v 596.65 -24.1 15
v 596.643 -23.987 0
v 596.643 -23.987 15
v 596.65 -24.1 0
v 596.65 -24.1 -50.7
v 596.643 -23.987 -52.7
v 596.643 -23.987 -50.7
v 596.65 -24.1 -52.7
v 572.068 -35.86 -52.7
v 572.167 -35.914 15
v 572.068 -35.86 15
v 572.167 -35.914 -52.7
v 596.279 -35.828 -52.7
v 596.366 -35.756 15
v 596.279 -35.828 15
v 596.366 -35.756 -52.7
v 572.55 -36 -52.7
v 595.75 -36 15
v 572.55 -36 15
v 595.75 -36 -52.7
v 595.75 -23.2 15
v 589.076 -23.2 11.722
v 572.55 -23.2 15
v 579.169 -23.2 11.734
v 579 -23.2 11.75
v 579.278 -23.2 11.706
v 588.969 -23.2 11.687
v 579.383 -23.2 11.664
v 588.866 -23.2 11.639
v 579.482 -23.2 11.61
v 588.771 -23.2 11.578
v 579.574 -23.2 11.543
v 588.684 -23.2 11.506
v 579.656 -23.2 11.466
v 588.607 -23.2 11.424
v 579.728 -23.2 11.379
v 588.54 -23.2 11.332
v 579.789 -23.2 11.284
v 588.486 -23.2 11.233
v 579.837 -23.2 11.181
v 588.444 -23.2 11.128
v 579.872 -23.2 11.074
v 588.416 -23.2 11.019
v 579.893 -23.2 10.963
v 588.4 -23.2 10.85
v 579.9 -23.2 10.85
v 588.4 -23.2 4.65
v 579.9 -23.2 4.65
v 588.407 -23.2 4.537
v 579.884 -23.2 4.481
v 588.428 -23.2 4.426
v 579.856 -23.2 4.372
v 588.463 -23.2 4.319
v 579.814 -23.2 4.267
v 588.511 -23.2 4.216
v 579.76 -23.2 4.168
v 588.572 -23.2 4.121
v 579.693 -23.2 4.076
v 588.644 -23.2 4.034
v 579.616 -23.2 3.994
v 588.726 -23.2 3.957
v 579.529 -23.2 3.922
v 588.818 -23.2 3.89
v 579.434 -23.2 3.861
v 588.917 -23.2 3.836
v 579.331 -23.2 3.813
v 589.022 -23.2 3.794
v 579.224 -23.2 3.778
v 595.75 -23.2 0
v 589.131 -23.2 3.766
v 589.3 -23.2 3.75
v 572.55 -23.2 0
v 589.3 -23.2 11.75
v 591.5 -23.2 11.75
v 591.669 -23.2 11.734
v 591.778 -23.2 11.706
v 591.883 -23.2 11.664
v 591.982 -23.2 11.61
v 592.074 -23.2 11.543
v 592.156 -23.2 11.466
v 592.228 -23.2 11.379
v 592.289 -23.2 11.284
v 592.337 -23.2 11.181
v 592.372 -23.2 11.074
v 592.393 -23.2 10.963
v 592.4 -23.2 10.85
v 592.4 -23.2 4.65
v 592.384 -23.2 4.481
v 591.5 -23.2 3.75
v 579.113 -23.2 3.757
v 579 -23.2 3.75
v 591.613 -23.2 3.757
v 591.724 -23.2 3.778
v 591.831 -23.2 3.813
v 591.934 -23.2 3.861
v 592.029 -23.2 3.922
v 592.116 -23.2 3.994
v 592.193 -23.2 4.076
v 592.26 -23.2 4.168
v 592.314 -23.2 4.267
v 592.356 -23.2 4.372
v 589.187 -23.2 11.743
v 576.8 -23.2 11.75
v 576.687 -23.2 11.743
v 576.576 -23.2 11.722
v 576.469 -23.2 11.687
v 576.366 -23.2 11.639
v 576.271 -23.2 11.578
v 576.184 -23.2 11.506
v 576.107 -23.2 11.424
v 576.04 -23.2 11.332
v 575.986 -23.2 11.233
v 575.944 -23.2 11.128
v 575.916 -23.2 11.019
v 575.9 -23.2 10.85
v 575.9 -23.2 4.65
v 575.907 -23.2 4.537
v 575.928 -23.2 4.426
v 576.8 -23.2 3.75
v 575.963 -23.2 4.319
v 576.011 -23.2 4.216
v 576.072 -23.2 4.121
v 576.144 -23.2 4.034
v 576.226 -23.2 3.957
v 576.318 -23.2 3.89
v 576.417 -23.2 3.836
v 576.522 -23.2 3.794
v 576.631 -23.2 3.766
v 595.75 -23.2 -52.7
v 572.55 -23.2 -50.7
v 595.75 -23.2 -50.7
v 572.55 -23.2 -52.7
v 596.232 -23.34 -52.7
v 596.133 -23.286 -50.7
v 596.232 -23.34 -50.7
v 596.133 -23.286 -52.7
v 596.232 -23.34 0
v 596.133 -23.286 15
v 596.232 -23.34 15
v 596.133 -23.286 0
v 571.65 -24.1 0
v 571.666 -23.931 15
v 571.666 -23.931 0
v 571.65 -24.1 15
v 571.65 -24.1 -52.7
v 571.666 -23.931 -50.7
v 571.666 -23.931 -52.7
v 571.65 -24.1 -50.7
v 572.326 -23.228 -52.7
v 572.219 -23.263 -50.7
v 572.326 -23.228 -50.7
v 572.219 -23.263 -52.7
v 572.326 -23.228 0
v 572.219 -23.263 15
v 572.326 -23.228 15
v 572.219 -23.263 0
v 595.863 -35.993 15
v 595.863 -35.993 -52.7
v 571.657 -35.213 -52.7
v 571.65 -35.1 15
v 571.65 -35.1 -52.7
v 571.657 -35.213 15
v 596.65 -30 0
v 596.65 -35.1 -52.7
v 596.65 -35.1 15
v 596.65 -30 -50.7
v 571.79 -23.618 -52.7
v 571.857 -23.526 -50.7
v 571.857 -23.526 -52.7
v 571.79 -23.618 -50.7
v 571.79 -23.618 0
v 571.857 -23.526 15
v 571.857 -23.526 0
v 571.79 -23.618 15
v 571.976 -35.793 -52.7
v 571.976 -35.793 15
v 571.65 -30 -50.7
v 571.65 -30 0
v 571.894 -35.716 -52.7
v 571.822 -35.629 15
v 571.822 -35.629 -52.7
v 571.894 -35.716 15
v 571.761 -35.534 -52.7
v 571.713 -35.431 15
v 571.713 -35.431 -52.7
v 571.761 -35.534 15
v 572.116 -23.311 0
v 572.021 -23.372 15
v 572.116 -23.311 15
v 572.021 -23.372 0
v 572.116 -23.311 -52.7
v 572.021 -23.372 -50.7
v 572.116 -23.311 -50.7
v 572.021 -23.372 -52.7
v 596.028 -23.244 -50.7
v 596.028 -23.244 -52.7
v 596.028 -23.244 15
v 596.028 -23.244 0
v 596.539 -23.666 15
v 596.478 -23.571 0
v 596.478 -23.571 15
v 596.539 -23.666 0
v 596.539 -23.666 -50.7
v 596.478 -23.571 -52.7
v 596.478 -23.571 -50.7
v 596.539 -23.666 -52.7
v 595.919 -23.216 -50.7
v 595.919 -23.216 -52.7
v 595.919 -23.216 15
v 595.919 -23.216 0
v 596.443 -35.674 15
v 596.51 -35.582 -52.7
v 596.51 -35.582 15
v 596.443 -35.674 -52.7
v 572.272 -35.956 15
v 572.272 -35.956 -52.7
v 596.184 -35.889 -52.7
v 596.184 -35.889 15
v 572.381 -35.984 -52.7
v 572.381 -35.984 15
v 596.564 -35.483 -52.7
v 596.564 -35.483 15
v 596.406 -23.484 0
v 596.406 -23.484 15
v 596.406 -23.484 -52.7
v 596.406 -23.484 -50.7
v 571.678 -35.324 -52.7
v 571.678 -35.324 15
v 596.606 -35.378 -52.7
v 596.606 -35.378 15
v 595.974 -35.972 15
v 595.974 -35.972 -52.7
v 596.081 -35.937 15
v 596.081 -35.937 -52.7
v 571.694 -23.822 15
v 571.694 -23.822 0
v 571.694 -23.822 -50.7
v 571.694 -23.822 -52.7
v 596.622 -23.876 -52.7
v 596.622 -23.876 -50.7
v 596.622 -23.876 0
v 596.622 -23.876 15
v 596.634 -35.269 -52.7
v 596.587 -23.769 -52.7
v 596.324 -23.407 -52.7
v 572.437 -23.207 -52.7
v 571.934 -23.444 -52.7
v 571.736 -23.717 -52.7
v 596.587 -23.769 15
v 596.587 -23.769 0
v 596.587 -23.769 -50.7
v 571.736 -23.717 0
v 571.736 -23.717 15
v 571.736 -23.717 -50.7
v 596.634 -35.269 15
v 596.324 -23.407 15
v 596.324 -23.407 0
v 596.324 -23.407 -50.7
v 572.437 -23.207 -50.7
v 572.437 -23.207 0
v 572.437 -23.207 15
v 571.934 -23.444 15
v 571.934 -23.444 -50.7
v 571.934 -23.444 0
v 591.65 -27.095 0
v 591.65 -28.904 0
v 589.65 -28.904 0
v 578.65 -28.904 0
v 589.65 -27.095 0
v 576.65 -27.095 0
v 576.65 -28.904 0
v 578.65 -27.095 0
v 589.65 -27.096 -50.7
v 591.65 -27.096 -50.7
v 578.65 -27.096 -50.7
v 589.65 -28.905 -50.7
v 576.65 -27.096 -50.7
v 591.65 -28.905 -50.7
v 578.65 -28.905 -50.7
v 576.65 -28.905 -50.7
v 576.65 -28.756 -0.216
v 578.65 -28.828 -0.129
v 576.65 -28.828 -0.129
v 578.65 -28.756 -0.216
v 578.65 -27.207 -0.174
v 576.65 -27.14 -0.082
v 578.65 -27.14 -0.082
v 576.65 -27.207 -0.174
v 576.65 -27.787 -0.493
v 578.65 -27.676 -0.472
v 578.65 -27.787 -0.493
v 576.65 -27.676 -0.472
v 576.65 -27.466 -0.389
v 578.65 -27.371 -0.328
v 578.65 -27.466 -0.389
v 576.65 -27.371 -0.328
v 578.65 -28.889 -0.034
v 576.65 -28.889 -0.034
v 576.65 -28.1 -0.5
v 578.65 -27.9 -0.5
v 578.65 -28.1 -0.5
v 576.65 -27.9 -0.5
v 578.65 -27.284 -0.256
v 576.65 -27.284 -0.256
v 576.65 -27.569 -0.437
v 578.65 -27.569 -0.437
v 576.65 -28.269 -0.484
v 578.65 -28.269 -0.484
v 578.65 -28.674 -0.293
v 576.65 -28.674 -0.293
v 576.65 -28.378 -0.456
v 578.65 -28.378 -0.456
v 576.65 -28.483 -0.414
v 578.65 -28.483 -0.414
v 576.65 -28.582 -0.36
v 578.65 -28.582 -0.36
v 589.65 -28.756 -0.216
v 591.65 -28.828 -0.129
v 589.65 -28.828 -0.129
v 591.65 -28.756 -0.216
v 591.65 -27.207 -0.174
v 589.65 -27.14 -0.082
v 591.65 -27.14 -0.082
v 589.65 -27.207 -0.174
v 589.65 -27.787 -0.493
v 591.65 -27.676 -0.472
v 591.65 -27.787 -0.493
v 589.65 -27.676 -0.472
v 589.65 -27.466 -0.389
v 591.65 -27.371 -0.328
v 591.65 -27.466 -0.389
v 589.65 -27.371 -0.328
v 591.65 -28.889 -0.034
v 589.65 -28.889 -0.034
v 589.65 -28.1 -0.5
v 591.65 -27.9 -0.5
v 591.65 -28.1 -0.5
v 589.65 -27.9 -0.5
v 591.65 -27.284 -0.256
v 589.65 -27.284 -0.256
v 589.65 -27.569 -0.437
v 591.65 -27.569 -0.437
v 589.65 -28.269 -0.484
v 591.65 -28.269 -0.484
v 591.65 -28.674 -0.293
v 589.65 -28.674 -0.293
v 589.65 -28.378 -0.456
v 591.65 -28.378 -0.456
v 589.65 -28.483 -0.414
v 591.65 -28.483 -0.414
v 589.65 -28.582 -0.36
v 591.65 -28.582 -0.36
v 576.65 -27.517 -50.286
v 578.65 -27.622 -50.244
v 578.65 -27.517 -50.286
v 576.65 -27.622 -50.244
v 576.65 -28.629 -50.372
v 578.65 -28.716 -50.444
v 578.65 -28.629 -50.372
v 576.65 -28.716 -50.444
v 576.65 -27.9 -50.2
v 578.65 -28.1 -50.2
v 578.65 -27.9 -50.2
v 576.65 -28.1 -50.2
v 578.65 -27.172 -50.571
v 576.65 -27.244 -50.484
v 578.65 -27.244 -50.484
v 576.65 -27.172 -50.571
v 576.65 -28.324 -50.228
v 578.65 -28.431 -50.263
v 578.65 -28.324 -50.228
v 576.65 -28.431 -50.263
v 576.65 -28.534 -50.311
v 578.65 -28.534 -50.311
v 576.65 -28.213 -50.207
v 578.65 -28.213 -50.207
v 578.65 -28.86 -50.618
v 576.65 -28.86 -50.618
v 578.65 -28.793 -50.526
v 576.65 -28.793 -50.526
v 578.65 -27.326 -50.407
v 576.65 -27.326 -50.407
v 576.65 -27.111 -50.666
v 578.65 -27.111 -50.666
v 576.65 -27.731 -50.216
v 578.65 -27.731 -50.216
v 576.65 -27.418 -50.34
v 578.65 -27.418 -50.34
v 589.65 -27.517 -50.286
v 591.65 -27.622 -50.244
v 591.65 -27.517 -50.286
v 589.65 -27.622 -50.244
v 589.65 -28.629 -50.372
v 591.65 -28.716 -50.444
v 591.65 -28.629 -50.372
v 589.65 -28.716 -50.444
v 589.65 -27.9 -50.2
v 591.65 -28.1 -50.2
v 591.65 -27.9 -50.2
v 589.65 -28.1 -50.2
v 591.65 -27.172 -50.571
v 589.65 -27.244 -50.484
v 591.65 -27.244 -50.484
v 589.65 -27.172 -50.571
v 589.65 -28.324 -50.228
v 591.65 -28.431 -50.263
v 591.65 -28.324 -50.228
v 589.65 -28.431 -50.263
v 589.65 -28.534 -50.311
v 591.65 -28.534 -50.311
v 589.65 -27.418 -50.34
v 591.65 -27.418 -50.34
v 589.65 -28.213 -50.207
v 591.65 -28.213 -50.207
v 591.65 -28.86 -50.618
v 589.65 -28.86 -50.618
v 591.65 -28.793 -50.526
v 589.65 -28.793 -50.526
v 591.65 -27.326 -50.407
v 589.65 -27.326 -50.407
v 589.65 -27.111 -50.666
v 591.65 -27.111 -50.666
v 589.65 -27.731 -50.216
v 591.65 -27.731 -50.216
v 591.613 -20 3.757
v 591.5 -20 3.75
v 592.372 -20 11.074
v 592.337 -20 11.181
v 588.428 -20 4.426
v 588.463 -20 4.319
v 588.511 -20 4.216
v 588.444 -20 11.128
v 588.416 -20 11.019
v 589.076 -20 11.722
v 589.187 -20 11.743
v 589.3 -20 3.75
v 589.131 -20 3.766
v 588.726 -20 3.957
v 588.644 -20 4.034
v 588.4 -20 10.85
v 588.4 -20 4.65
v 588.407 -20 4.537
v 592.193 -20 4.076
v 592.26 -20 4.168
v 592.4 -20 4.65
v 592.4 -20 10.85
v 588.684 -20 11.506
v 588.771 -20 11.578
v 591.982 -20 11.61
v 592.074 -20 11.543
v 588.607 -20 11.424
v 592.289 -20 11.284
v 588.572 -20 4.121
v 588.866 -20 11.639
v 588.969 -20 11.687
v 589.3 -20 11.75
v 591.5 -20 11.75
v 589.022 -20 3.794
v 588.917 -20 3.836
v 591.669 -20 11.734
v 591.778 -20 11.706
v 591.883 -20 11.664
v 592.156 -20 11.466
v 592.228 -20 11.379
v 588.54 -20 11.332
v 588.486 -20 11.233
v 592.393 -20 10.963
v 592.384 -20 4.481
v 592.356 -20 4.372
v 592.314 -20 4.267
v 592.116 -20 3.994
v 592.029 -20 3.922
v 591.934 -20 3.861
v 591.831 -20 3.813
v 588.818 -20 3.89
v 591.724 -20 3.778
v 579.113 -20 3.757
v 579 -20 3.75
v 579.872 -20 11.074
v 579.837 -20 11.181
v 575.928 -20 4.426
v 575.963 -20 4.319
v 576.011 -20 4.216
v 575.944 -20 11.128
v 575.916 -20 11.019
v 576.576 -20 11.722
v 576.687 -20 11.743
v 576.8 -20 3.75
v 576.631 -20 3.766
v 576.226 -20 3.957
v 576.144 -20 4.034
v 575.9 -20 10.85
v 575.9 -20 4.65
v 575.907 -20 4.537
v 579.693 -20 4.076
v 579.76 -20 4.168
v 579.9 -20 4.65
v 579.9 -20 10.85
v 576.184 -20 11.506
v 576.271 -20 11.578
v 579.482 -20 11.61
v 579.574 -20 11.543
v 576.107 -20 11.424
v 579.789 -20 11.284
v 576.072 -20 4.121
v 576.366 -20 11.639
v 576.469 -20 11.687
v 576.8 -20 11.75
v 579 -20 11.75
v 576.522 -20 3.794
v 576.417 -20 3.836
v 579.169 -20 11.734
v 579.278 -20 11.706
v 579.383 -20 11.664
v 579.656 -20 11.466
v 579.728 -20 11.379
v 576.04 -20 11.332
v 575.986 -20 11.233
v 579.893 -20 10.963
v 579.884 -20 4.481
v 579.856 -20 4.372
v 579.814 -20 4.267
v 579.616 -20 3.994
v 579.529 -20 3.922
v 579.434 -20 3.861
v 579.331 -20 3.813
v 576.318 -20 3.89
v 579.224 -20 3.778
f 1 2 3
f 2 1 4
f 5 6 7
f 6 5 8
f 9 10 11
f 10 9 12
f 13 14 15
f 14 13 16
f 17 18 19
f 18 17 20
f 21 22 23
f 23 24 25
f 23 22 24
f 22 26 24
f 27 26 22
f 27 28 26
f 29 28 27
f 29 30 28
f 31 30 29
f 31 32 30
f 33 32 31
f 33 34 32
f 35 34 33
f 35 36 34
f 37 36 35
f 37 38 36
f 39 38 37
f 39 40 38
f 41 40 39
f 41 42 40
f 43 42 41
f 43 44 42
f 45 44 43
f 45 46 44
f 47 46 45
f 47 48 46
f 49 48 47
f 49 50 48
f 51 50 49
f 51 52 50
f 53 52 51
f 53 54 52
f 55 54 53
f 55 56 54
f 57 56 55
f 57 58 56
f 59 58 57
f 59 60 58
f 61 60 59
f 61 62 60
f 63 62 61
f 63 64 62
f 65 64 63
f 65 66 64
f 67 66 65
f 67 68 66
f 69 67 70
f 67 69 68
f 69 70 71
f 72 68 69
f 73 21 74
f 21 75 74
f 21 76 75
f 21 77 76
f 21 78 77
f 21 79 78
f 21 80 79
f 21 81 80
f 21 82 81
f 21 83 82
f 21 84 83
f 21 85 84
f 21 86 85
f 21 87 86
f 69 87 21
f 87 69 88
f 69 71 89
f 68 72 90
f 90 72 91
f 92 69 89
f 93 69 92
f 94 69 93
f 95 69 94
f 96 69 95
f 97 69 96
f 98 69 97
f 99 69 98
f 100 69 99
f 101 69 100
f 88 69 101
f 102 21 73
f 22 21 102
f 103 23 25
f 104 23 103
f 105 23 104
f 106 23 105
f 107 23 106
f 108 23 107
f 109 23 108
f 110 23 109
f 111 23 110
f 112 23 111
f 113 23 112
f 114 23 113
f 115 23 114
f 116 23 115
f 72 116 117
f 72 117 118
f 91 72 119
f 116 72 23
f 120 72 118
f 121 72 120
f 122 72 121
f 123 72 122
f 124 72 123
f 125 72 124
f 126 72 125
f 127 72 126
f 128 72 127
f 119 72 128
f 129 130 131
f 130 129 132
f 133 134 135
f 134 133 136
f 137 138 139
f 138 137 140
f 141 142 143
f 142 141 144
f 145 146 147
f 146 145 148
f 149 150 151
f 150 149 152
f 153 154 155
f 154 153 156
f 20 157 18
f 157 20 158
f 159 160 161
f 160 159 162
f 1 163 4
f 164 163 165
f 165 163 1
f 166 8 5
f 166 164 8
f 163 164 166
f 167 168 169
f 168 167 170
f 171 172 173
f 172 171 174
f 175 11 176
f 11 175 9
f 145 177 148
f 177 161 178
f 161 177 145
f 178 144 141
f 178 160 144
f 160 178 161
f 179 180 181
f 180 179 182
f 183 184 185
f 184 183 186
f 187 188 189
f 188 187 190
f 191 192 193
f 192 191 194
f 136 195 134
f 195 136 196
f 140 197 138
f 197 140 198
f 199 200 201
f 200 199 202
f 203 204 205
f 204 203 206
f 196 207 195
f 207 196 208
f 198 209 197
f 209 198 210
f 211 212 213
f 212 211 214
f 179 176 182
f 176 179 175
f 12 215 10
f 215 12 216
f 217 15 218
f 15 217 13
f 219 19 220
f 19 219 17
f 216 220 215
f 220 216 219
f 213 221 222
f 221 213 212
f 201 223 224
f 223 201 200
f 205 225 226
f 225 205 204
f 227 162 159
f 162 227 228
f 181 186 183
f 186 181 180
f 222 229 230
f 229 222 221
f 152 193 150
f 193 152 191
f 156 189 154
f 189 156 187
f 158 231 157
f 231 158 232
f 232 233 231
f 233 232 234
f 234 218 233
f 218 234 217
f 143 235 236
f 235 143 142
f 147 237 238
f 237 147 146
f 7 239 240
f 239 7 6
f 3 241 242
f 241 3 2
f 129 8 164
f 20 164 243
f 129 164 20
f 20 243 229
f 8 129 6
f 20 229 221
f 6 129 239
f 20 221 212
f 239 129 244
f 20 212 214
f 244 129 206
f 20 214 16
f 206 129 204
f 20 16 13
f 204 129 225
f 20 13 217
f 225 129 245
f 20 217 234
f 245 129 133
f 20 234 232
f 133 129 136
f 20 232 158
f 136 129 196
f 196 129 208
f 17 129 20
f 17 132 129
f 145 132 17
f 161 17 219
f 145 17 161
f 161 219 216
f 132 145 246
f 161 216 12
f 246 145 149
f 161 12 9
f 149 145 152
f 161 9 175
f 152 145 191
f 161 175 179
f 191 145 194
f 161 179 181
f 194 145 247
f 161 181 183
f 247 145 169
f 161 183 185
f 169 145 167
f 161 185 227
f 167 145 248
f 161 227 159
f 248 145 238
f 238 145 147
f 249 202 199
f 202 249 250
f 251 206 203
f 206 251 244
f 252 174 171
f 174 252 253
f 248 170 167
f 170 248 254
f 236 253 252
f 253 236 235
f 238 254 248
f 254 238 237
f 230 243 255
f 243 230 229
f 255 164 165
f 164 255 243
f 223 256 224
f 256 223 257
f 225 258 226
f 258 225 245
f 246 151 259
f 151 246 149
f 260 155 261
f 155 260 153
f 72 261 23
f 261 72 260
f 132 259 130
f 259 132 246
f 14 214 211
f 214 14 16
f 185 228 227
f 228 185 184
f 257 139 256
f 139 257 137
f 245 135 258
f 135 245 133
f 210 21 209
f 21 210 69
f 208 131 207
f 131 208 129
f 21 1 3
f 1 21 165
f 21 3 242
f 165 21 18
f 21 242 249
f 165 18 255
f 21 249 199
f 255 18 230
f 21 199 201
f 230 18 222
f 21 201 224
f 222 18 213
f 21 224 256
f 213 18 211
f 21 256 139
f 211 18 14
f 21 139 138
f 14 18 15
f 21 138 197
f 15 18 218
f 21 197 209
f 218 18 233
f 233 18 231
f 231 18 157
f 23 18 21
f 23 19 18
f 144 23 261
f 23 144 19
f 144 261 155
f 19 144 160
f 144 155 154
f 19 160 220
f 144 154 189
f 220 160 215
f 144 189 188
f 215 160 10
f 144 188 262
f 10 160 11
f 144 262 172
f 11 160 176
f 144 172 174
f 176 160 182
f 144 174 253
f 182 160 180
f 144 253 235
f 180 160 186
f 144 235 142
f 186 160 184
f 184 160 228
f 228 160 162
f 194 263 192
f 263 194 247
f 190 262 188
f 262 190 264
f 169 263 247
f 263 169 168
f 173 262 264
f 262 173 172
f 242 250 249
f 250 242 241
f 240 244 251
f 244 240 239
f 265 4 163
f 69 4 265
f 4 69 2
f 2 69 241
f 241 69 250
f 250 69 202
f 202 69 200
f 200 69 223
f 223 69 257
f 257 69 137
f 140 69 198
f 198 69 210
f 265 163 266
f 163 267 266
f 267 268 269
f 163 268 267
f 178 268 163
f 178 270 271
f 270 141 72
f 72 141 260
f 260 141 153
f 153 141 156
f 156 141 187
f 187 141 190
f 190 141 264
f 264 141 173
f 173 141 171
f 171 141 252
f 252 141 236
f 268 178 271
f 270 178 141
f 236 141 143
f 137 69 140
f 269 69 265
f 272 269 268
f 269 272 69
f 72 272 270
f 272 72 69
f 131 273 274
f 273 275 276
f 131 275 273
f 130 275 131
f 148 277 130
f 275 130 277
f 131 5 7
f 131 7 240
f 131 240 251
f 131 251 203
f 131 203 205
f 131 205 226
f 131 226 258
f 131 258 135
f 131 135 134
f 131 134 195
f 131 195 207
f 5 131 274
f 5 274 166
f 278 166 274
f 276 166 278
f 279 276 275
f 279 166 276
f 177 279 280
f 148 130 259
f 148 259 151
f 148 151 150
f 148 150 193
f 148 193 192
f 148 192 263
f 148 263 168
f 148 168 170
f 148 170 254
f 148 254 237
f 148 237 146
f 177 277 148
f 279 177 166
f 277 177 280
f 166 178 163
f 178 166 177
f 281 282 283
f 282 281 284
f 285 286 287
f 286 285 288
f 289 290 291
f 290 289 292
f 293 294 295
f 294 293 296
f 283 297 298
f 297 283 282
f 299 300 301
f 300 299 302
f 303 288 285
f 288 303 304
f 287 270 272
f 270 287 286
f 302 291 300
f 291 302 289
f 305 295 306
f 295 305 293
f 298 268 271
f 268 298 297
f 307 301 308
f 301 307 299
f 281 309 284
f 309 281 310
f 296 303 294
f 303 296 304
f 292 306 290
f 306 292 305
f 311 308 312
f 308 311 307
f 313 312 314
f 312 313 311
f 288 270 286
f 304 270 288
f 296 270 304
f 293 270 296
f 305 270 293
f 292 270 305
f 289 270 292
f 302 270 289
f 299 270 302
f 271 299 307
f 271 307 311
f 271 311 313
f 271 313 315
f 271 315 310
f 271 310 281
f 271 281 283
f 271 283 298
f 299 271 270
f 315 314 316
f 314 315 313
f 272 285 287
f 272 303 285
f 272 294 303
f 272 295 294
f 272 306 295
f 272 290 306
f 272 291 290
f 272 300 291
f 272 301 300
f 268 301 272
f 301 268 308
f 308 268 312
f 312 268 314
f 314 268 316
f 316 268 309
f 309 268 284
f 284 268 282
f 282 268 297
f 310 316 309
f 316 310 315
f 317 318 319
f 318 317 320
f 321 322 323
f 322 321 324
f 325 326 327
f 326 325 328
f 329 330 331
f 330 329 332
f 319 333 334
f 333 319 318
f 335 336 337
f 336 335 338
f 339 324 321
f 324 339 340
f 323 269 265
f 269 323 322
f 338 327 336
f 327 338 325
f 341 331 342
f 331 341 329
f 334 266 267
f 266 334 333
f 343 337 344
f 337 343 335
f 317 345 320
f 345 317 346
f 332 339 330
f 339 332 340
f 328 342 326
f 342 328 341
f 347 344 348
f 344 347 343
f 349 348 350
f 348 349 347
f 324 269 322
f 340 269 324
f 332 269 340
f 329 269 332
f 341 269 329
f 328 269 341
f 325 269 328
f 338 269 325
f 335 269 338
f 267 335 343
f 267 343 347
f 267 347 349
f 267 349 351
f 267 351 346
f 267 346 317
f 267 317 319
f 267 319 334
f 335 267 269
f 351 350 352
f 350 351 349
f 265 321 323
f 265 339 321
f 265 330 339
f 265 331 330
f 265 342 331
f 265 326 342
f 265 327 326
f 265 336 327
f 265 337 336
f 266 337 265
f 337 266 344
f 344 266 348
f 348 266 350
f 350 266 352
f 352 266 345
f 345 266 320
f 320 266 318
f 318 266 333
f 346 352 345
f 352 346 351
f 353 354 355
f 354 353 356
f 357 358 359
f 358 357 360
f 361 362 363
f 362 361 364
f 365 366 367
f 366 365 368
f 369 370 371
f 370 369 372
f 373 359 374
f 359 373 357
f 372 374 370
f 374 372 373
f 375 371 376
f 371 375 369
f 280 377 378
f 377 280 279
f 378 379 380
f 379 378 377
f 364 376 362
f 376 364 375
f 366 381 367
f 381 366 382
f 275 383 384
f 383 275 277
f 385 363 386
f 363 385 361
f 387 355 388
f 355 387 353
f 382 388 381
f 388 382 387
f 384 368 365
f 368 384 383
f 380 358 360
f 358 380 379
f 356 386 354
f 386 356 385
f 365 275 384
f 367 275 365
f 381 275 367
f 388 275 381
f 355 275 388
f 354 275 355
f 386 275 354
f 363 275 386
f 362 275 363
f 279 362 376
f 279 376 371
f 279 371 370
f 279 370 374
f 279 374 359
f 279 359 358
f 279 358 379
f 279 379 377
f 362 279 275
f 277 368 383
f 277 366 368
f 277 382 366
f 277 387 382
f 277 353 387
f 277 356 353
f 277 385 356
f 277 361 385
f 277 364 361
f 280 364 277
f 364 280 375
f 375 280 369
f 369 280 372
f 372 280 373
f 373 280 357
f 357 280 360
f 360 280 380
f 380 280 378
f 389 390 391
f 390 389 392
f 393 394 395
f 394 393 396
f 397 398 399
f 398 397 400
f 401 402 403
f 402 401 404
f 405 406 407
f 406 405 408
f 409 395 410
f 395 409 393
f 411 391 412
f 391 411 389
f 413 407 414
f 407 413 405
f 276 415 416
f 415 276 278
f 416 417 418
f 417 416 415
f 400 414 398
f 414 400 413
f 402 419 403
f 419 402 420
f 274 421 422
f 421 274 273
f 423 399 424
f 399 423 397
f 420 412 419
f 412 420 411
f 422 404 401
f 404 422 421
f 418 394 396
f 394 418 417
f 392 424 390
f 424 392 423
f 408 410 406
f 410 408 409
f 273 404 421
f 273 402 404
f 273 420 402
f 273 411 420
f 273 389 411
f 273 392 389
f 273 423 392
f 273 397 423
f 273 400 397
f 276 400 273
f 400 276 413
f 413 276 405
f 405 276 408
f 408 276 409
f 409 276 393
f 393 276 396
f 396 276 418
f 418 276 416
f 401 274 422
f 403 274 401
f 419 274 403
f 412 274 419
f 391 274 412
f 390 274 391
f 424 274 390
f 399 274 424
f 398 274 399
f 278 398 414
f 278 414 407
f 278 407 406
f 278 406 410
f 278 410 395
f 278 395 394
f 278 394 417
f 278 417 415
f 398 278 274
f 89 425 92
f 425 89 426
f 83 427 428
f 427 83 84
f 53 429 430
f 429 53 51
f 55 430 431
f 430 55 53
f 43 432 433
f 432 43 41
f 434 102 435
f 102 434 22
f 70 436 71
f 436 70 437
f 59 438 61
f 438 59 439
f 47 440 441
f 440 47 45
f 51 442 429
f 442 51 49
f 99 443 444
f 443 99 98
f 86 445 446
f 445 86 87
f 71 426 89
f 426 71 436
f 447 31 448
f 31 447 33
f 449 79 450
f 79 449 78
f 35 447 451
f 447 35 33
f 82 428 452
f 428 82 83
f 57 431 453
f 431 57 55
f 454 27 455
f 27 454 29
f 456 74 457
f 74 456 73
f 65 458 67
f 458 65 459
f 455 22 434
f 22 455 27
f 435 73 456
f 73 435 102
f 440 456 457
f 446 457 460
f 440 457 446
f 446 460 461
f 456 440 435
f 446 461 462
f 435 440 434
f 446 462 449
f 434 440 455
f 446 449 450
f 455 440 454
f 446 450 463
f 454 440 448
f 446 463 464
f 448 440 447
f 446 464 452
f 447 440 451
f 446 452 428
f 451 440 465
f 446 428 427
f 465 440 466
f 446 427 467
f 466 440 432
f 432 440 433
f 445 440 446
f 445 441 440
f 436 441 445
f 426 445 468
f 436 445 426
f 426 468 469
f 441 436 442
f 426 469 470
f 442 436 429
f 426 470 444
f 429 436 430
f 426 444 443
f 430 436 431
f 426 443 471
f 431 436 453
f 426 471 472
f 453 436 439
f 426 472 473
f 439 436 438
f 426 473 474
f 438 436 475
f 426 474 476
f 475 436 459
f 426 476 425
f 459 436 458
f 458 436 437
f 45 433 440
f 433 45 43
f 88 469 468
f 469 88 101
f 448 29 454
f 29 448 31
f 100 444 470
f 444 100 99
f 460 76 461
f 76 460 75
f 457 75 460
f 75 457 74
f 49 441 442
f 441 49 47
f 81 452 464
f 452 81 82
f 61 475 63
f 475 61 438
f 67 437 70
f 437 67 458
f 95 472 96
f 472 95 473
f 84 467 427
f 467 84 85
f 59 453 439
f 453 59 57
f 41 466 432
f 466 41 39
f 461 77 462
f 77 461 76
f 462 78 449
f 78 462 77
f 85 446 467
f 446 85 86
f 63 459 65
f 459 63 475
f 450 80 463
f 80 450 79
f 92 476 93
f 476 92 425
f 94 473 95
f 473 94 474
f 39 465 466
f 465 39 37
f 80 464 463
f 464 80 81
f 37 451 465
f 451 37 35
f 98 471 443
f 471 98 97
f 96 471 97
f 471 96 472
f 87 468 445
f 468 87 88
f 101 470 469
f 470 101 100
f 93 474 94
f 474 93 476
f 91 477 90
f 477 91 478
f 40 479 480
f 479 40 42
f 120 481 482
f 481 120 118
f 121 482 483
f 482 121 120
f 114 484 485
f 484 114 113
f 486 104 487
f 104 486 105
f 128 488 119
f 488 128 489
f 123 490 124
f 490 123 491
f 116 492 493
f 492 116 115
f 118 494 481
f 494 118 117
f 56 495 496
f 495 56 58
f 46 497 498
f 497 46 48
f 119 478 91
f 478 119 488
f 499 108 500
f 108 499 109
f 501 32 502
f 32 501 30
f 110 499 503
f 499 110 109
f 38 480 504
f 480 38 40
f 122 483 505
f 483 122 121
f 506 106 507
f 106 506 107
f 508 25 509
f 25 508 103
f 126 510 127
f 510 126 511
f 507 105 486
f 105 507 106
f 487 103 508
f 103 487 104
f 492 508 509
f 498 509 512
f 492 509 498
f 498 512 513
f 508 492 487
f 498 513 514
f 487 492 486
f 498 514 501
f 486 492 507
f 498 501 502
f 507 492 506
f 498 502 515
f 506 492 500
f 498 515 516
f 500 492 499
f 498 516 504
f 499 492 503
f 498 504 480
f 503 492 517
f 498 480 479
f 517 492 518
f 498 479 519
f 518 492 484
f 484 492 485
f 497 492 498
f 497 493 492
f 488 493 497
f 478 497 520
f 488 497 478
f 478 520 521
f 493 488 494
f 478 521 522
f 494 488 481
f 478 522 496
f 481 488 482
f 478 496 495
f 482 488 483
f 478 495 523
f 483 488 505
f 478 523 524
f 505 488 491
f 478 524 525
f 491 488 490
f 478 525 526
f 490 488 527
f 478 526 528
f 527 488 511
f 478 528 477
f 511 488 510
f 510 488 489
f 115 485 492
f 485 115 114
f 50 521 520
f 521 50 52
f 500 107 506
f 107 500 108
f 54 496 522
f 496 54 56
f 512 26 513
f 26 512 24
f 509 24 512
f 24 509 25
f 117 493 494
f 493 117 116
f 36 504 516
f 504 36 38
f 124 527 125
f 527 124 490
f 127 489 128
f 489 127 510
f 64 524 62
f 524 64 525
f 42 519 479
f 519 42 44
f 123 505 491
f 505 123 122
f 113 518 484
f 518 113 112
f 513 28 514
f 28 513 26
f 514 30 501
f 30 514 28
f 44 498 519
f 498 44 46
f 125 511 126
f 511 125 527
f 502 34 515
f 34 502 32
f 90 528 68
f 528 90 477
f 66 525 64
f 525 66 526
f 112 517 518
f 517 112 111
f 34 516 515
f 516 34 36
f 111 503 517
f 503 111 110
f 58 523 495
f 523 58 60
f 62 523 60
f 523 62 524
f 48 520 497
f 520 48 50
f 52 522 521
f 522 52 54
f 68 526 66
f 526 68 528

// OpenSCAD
// file: bottom_right_hinge.scad
include <parameters.scad>
use <utility.scad>
use <support.scad>
use <construction.scad>

module bottom_right_hinge(open=false) {
    difference() {
        translate([enclosure_width - (frame_corner_width+plastic_thickness+hinge_gap),
                (hinge_inner_diameter)/2,0]) 
            mirror([1,0,0])
                rotate([0,0,open?-90:0]) 
                color("Salmon")
                hinge();
        fix_preview() right_door(open);
    }
}

bottom_right_hinge();
// file: front_right_bottom_corner.scad
include <parameters.scad>
use <utility.scad>
use <support.scad>
use <construction.scad>
use <bottom_right_hinge.scad>

module front_right_bottom_corner() {
    difference() {
        translate([enclosure_width,0,0])
            mirror([1,0,0])
                add_snap_lock_slot(top=false) 
                add_hinge_post(top=false)
                add_connector()  
                add_outside_frame(frame_corner_height) 
                extend_frame_x()          
                    color("SteelBlue") 
                    frame_corner( frame_corner_width, 
                        frame_corner_height,frame_thickness, 
                        corner_roundness);                   
        fix_preview() right_wall_panel();
    }
}

//%right_wall_panel();
%bottom_right_hinge();
front_right_bottom_corner();
// file: construction.scad
/*
Specialized construction functions specifically for the enclosure.
By combining these operators the various instances of enclosure pieces 
can be constructed.
*/
include <parameters.scad>;
use <utility.scad>;

module lug() {
    ra = knob_diameter/2;
    rb = lug_diameter/2;
    rotate([0,90,90]) 
        rotate_extrude()
            color("DarkSeaGreen")
            polygon([[0,0],[0,lug_height],[rb,lug_height],
                [rb,2.5],[ra,1],[ra,0]]);
}

// extend the corner frame to be symmetrical with the front corner
module extend_frame_x(height=frame_corner_height) {
    union() {
        children();
        color("SteelBlue")
        translate([hinge_inner_diameter*2, hinge_inner_diameter,0]) 
            rotate([0,0,-90])
                frame( hinge_inner_diameter*3+1, 
                    height, hinge_inner_diameter, 
                    corner_roundness );
    }
}

module frame( width, height, thickness, roundness ) {
        linear_extrude(height=height)
            apply_roundness(roundness, $fs =0.01) 
                    square( [thickness, width] );
}

module frame_corner( width, height, thickness, roundness ) {    
    union() {
        mirror([0,1,0]) 
            rotate([0,0,-90])
                frame( width, height, thickness, roundness );
        frame( width, height, thickness + panel_thickness, roundness );
    }   
}

module frame_connector_corner(clearance=0) {
    translate([panel_thickness*1.7,panel_thickness*0.70, 0]) 
        cornerize()
            frame( frame_corner_width*0.75, frame_connector_depth, 
                frame_thickness*.20+clearance, corner_roundness );
        
}

module add_lugs() {   
    union() {
        children();
        translate([lug_offset_x,-lug_height,lug_offset_z]) 
            lug();
        translate([lug_offset_x,-lug_height, lug_offset_z+lug_offset_gap])
            lug(); 
    } 
}

module add_connector(height=frame_corner_height) {
    union() {
        children();

        color("SteelBlue")
        translate([0,0,height])
            frame_connector_corner();
    }
}

module add_hinge_post( top=false ) {
    union() {
        difference() {
            children();

            // create a negative space that snuggly fits the hinge
            translate([frame_corner_width+plastic_thickness+hinge_gap,
                hinge_inner_diameter/2, (top?frame_corner_height:0)])
                mirror(top?[0,0,1]:[0,0,0])
                    union() {
                         height = hinge_height-hinge_inner_diameter;
                        translate([0,0,height/2]) 
                            cube([hinge_inner_diameter+2,
                                hinge_inner_diameter+2,height+1.3],true);
                        // hinge open
                        rotate([0,0,-90]) translate([0,0,-0.1]) scale(1.05) hinge();
                        // hinge closed
                        rotate([0,0,0]) translate([0,0,-0.1]) scale(1.05) hinge();
                    }
            
        }
        color("SteelBlue")
        translate([frame_corner_width+plastic_thickness+hinge_gap,hinge_inner_diameter/2,0])
            cylinder(d=hinge_inner_diameter, frame_corner_height);
    }
}

module add_outside_frame( height ) {
    union() {
        children();
        translate([-plastic_thickness,-plastic_thickness,0])
            color("SteelBlue")
            frame( frame_corner_width+plastic_thickness, height, frame_thickness,
                corner_roundness);
        translate([14.5,0.05,height/2])
            color("SteelBlue")
            rotate([0,0,8])
            cube([frame_corner_width/2,plastic_thickness,height],true);
    }
}

module hinge() {
    height = hinge_height-hinge_inner_diameter;
    width = hinge_inner_diameter+hinge_ring_thickness;
    difference() {
        
        // create the base shape for the hinge
        union() {    
            cylinder(d=width, height);
            
            translate([hinge_inner_diameter*3+hinge_clearance,
                -hinge_offset,height/2-plastic_thickness/2]) 
                cube([hinge_length,hinge_thickness,
                    height+plastic_thickness],true);
           
            translate([2.52,-5.2,height/2]) 
                rotate([0,0,40]) 
                    cube([hinge_inner_diameter,
                        width+1,height],true);
        }
        
        // remove a hole for the hinge post to slide into
        cylinder(d=hinge_inner_diameter+tolerance_smooth, height+1);
        
        // trim the left corner
        translate([4,-17.5,height/2-1]) 
            rotate([0,0,145]) 
                cube([50,width-2,height+3],true);
        
        // smooth the tranistion to the bottom edge
        translate([32,-10,height/2-18.25]) 
            rotate([-88.5,0.1,96]) 
                cube([40,20,60],true);
        
        // add a chamfer to right corner
        translate([hinge_length+8,0,height+25]) 
            rotate([0,45,0]) 
            cube(50,true);
    }   
}

module add_connector_slot() {
    difference() {
        children();
        frame_connector_corner(tolerance_tight);
    }
}

module frame_vertical() {
    add_connector_slot()
    add_connector(frame_vertical_height)
    extend_frame_x(frame_vertical_height)
        frame_corner( frame_corner_width, 
            frame_vertical_height, frame_thickness, 
            corner_roundness );          
}

module grip() {
    rotate([90,90,90])
        color("DarkSeaGreen")
        frame(plastic_thickness,plastic_thickness,plastic_thickness,corner_roundness);
}

module add_snap_lock_slot(top=false) {
    difference() {
        children();
        translate([0,0,top?frame_corner_height+shelf_height:-shelf_height])
            mirror(top?[0,0,1]:[0,0,0])
                 snaplock(tolerance_tight,top);
    }
}

module lug2() {
    color("DarkSeaGreen")
    rotate([90,0,0])
            frame(frame_connector_depth,snaplock_connector_size/2,
                connector_thickness,corner_roundness);
}

module snaplock(clearance=0,top=false) {
    height = shelf_height+snaplock_connector_size+plastic_thickness+clearance;
    union() {
        color("Magenta")
        difference() {
            translate([snaplock_size,-snaplock_thickness*3,-plastic_thickness])
                rotate([0,0,90])
                    frame(snaplock_size+clearance,height,
                        snaplock_width*2+plastic_thickness, corner_roundness);
            fix_preview2() cube([snaplock_size*1.1,snaplock_width+plastic_thickness,shelf_height]);
        }

        // grips at top
        translate([5,1,shelf_height+1.5]) grip();
        translate([18,1,shelf_height+1.5]) grip();

        // grips at bottom
        translate([5,1,0.5]) grip();
        translate([18,1,0.5]) grip();

        // connector lugs
        translate([3*snaplock_size/4-connector_thickness/2,
            frame_connector_depth+snaplock_thickness,
            shelf_height+snaplock_connector_size/2 - (snaplock_connector_size/4) ])
            lug2();

        translate([(top?2:1)*snaplock_size/4-connector_thickness/2,
            frame_connector_depth+snaplock_thickness,
            shelf_height+snaplock_connector_size/2 - (snaplock_connector_size/4)])
            lug2();
    }
}
// file: support.scad
/*
Provides support objects that are used to model the environment of the enclosure
to ensure the pieces slot together and fit properly.
*/
include <parameters.scad>;
use <utility.scad>;

module wall_panel() {
    cube([panel_height,panel_width,panel_thickness]);
}

module door_panel() {
     cube([door_panel_width,door_panel_height,door_panel_thickness]);
}

module left_wall_panel() {
    translate([panel_thickness,0,panel_offset_z]) 
        rotate([0,-90,0]) 
            wall_panel();
}

module back_wall_panel() {
    translate([(enclosure_width-panel_width)/2,
            enclosure_depth-panel_thickness-plastic_thickness,
            0]) 
        rotate([-90,-90,0]) 
            wall_panel();
}

module right_wall_panel() {
    translate([enclosure_width,0,panel_offset_z]) 
        rotate([0,-90,0]) 
            wall_panel();
}

module left_door(open=false) {
    translate([frame_corner_width+plastic_thickness+hinge_gap,
            hinge_inner_diameter/2,0]) 
        rotate([90,0,open?-90:0]) 
            translate([door_hinge_offset,0,hinge_offset-
                    door_panel_thickness/2])
                door_panel();
}

module right_door(open=false) {
    translate([enclosure_width,0,0])  
        mirror([1,0,0]) left_door(open);
}
// file: utility.scad
/*
Generically useful utility functions.
*/

// applies roundness without altering dimensions of object
module apply_roundness(r)
    offset(r) offset(delta=-r) children(0);

// makes a corner piece by mirroring and rotating one side
module cornerize() {
    union() {
        children(0);
        mirror([0,1,0]) 
            rotate([0,0,-90])
                children(0);
    }
} 

module explode(vector) {
    for(i=[0:$children-1])
        translate(vector*i)
            children(i);

}

/*
 The fix_preview series of functions are used to make small
 translations in order to reduce conincident plane artifacts
 from the preview mode. 

 It would be nice to have just one module for this but I haven't
 figured out a way of doing this generically - so the following
 uses a small translation in different directions depending on
 the use case needed.
*/
module fix_preview() {
    translate($preview?[-0.001,-0.001,-0.001]:[0,0,0])
        children(0);
}

module fix_preview2() {
    translate($preview?[-0.001,0.001,-0.001]:[0,0,0])
        children(0);
}

module fix_preview3() {
    translate($preview?[-0.001,0.001,0.001]:[0,0,0])
        children(0);
}
// file: parameters.scad
$fn=50;

// Wall thickness and tolerance
plastic_thickness=2.0;
tolerance_smooth=0.45;
tolerance_tight=0.40;
corner_roundness=0.9;

// Specify enclosure dimensions
enclosure_height=475.0;
enclosure_depth=535.0;

// Wall panel dimensions
panel_thickness=6.0;
panel_height=450.0;
panel_width=535.0;
panel_offset_z = enclosure_height - panel_height;

// Door panel dimensions
door_panel_thickness=3.0;
door_panel_width=250.0;
door_panel_height=475.0;
door_hinge_offset=6.5;

// Frame
frame_corner_width=30.0;
frame_corner_height=79.0;
frame_thickness = plastic_thickness*2 + panel_thickness;
frame_side = (enclosure_height - frame_corner_height*2)/2;
frame_clip_height=50.5;
frame_vertical_height = (enclosure_height-frame_corner_height*2)/2;
frame_connector_depth = 8.0;

// Lug
knob_diameter=9.8;
lug_diameter=6.2;
lug_gap=1.4;
lug_height = lug_gap+2.15;
lug_offset_x=15.0;
lug_offset_z=27.0;
lug_offset_gap=32;

// Snaplock
shelf_height=50.3+tolerance_tight;
snaplock_width=5+tolerance_tight;
snaplock_size=25;
snaplock_thickness=plastic_thickness;
snaplock_connector_size=15;
connector_thickness=frame_thickness*.4;

// Door hinge
hinge_inner_diameter=10;
hinge_height=25;
hinge_length=53;
hinge_gap = 9.6;
hinge_clearance = 1.5;
hinge_ring_thickness=3.0;
hinge_thickness=plastic_thickness*2 + door_panel_thickness;
hinge_offset=6.5+plastic_thickness;

enclosure_width=2*(frame_corner_width+plastic_thickness+hinge_gap
    +door_hinge_offset) + door_panel_width*2 +tolerance_smooth;
// main file
include <parameters.scad>
use <utility.scad>
use <support.scad>
use <construction.scad>
use <front_right_bottom_corner.scad>
use <bottom_right_hinge.scad>

module front_right_bottom_snaplock() {
    translate([enclosure_width - snaplock_size, 0, -shelf_height])
        snaplock();
}

%front_right_bottom_corner();
%bottom_right_hinge();
translate([0,-30,0])
    front_right_bottom_snaplock();
